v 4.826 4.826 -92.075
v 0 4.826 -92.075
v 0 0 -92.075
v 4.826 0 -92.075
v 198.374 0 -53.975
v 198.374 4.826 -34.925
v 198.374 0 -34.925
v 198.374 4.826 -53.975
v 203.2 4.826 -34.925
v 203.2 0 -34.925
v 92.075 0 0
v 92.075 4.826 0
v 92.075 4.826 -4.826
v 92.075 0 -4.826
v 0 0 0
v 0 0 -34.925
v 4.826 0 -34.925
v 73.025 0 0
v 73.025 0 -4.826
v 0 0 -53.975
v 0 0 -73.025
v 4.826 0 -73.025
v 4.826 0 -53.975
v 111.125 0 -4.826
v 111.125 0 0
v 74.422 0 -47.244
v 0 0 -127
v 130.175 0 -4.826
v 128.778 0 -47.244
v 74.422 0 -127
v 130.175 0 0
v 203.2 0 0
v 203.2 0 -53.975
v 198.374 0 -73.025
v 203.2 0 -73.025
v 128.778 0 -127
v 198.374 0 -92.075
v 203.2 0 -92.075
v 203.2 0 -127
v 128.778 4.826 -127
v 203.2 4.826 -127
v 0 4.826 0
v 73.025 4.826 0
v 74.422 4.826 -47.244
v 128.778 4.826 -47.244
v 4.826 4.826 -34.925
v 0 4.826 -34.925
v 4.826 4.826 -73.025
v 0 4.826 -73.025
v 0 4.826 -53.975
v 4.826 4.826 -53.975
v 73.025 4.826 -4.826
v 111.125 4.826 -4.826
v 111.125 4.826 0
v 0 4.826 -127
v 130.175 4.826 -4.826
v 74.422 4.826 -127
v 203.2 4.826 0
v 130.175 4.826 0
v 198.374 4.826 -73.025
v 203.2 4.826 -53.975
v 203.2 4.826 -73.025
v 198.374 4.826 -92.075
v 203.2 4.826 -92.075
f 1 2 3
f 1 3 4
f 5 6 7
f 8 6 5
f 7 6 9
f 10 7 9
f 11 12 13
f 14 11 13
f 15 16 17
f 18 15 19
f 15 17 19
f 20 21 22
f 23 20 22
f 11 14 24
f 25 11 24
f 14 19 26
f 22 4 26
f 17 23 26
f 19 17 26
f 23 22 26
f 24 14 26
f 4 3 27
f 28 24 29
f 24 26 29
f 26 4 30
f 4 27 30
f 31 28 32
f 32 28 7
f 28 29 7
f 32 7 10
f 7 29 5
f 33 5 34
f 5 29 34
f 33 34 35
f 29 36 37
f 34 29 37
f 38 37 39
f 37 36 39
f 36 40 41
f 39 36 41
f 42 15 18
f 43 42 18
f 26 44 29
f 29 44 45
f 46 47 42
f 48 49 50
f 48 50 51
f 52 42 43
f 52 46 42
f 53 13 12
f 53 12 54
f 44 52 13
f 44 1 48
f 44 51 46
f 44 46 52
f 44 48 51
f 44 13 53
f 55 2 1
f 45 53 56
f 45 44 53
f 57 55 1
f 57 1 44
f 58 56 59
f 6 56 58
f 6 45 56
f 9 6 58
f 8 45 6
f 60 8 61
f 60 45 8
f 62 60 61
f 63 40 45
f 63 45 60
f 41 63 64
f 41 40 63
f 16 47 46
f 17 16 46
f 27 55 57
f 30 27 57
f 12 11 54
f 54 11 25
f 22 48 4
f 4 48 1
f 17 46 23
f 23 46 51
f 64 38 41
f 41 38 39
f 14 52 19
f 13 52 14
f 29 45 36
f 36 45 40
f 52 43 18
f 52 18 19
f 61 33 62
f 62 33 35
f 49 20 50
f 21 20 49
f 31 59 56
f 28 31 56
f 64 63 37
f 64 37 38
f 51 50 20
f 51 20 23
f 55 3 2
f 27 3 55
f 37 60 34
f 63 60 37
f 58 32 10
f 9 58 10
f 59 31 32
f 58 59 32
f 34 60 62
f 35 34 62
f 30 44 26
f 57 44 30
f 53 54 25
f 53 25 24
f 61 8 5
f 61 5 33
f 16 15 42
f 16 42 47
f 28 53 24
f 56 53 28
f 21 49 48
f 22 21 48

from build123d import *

# Parameters (mm, degrees)
SKETCH1_W        = 203.2
SKETCH1_H        = 177.8
BASE_DEPTH       = 4.826
SKETCH5_W        = 203.2
SKETCH5_H        = 50.8
TRIM_DEPTH       = 271.048829429
SKETCH3_W        = 54.356
SKETCH3_H        = 79.756
CENTER_CUT_DEPTH = 240.67171355
SKETCH2_W        = 4.826
SKETCH2_H        = 19.05
SIDE_SLOTS_DEPTH = 240.67171355
SKETCH4_W        = 19.05
SKETCH4_H        = 4.826
REAR_SLOTS_DEPTH = 240.67171355


with BuildPart() as part:
    # Sketch1 → Base (new body)
    with BuildSketch(Plane(origin=(0, 0, 0), x_dir=(1, 0, 0), z_dir=(0, 1, 0))):
        with Locations((101.6, 88.9)):
            Rectangle(SKETCH1_W, SKETCH1_H)
    extrude(amount=BASE_DEPTH)

    # Sketch5 → Trim (cut, through all)
    with BuildSketch(Plane(origin=(0, 4.826, 0), x_dir=(1, 0, 0), z_dir=(0, 1, 0))):
        with Locations((101.6, 152.4)):
            Rectangle(SKETCH5_W, SKETCH5_H)
    extrude(amount=-TRIM_DEPTH, mode=Mode.SUBTRACT)

    # Sketch3 → Center Cut (cut, through all)
    with BuildSketch(Plane(origin=(0, 4.826, 0), x_dir=(1, 0, 0), z_dir=(0, 1, 0))):
        with Locations((101.6, 87.122)):
            Rectangle(SKETCH3_W, SKETCH3_H)
    extrude(amount=-CENTER_CUT_DEPTH, mode=Mode.SUBTRACT)

    # Sketch2 → Side Slots (cut, through all)
    with BuildSketch(Plane(origin=(0, 4.826, 0), x_dir=(1, 0, 0), z_dir=(0, 1, 0))):
        with Locations((2.413, 82.55)):
            Rectangle(SKETCH2_W, SKETCH2_H)
        with Locations((2.413, 44.45)):
            Rectangle(SKETCH2_W, SKETCH2_H)
        with Locations((200.787, 44.45)):
            Rectangle(SKETCH2_W, SKETCH2_H)
        with Locations((200.787, 82.55)):
            Rectangle(SKETCH2_W, SKETCH2_H)
    extrude(amount=-SIDE_SLOTS_DEPTH, mode=Mode.SUBTRACT)

    # Sketch4 → Rear Slots (cut, through all)
    with BuildSketch(Plane(origin=(0, 4.826, 0), x_dir=(1, 0, 0), z_dir=(0, 1, 0))):
        with Locations((82.55, 2.413)):
            Rectangle(SKETCH4_W, SKETCH4_H)
        with Locations((120.65, 2.413)):
            Rectangle(SKETCH4_W, SKETCH4_H)
    extrude(amount=-REAR_SLOTS_DEPTH, mode=Mode.SUBTRACT)


solid = part.part
